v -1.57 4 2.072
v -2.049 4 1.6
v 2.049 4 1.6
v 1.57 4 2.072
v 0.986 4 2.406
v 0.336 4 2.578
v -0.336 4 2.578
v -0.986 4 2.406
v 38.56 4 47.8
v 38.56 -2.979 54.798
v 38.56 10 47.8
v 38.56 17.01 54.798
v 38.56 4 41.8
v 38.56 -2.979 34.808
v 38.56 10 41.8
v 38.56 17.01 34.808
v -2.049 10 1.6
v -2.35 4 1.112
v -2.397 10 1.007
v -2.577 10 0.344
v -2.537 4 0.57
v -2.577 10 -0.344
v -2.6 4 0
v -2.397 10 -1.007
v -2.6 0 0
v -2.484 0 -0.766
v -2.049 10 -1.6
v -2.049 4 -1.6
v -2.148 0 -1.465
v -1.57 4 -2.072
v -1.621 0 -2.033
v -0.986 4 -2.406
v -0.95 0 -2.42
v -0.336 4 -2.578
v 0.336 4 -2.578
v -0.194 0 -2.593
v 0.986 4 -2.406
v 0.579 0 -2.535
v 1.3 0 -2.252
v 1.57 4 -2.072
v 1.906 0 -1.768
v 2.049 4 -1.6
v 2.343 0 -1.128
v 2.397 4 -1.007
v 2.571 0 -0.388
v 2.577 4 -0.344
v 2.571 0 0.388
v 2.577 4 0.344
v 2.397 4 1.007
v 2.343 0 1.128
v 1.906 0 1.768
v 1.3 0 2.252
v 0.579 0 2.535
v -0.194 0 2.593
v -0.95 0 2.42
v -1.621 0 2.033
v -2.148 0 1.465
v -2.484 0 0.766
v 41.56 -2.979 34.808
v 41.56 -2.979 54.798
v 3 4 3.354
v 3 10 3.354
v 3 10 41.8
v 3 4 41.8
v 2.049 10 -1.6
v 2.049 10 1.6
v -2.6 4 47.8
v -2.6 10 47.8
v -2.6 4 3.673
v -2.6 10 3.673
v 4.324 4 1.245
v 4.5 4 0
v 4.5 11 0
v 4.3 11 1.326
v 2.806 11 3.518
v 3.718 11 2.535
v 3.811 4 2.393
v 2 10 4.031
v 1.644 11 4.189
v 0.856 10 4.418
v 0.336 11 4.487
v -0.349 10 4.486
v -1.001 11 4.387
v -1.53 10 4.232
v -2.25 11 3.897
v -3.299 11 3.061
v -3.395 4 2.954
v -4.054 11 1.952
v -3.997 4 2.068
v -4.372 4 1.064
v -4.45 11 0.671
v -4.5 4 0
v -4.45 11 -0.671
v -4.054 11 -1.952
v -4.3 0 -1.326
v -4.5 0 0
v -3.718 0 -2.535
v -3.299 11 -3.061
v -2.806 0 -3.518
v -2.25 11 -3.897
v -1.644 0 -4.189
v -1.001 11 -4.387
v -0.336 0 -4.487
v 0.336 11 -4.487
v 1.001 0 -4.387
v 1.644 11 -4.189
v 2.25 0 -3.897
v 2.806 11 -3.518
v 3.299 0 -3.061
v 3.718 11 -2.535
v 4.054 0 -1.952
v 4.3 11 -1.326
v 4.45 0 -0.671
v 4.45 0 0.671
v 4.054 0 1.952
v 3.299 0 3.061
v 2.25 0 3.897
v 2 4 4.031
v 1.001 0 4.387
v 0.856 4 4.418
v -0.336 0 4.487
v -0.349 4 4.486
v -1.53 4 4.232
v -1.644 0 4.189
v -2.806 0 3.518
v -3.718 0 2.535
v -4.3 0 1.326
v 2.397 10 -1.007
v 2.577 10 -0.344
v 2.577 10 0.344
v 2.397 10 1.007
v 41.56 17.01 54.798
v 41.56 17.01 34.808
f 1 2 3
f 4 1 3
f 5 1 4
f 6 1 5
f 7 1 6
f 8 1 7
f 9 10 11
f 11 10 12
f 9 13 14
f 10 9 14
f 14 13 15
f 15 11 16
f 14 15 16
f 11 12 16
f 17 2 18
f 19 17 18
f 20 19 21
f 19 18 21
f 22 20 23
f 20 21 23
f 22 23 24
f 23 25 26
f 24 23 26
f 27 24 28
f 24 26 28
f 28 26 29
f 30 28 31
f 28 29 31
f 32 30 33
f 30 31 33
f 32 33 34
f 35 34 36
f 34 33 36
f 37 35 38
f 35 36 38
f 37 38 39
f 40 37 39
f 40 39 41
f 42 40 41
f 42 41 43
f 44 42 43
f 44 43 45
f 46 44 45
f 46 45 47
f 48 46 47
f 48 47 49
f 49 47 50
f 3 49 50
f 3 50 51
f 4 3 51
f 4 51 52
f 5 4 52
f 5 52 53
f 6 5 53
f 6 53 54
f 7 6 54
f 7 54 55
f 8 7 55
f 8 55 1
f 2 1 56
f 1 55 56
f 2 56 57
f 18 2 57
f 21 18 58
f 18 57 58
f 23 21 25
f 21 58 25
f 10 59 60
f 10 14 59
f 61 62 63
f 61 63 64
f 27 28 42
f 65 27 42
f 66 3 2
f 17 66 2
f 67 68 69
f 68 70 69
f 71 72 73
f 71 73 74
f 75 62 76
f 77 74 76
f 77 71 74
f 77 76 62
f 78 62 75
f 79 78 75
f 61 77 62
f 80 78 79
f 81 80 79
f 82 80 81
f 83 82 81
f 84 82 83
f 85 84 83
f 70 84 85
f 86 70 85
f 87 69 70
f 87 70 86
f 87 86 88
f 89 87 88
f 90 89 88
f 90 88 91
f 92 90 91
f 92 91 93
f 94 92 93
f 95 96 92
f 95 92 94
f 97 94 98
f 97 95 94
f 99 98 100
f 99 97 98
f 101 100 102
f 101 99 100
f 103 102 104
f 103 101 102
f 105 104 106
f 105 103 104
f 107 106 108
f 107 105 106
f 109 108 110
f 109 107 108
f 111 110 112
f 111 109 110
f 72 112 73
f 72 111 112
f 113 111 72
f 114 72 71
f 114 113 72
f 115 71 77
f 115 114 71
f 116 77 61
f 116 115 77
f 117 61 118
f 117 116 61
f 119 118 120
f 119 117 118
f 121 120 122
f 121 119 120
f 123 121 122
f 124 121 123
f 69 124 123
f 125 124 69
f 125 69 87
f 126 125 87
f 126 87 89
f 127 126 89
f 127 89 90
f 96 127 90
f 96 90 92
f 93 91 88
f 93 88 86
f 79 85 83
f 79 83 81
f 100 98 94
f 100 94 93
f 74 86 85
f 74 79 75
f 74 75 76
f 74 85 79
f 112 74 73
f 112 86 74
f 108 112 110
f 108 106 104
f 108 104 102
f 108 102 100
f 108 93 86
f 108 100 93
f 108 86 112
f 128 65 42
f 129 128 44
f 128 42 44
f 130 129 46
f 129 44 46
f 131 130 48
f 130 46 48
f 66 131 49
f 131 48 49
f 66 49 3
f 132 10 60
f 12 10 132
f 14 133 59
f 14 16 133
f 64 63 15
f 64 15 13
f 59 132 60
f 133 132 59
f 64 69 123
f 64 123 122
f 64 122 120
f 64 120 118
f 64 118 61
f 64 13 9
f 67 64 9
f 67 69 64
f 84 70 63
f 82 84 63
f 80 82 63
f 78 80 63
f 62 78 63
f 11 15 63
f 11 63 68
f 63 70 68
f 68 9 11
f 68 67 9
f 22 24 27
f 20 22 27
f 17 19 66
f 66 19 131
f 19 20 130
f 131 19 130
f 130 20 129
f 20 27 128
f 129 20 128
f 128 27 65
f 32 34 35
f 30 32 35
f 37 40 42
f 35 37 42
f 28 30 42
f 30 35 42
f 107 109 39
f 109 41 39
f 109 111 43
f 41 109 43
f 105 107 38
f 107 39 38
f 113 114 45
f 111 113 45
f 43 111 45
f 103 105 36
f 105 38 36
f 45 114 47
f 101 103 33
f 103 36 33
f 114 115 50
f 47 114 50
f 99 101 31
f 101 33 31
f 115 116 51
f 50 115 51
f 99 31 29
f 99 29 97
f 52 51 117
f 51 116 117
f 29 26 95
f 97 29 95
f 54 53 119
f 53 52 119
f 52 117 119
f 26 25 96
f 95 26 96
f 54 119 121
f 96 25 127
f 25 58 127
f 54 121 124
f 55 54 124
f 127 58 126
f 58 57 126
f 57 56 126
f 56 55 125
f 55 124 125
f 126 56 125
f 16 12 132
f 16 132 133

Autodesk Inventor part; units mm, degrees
ref_plane "YZ Plane" through (0, 0, 0) normal (1, 0, 0) x (0, 1, 0)
ref_plane "XZ Plane" through (0, 0, 0) normal (0, 1, 0) x (-1, 0, 0)
ref_plane "XY Plane" through (0, 0, 0) normal (0, 0, 1) x (1, 0, 0)
sketch "Sketch3" plane through (0, 0, 0) normal (0, 1, 0) x (-1, 0, 0)
  circle A0 centre (0, 0) radius 4.5
  circle A1 centre (0, 0) radius 2.6
  dimension "d10" = 9
  dimension "d11" = 5.2
extrude "Extrusion2" add sketch "Sketch3" along normal blind 4
sketch "Sketch4" plane through (0, 4, 0) normal (0, 1, 0) x (1, 0, 0)
  circle A0 centre (0, 0) radius 2.6 projected
  line L0 (0, -2.6) -> (0, -1.6)
  line L1 (0, -1.6) -> (0, 2.6)
  line L2 (0, -1.6) -> (-2.0494, -1.6)
  line L3 (0, -1.6) -> (2.0494, -1.6)
  line L4 (0, 2.6) -> (0, 2.6)
  line L5 (0, 2.6) -> (0, 2.6)
  circle A1 centre (0, 0) radius 4.5 projected
  circle A2 centre (0, 0) radius 2.6 projected
  line L6 (0, 2.6) -> (0, 1.6)
  line L7 (0, 1.6) -> (2.0494, 1.6)
  line L8 (0, 1.6) -> (-2.0494, 1.6)
  point P0 (2.0494, 1.6)
  point P1 (-2.0494, 1.6)
  dimension "d14" = 1
  dimension "d20" = 1
extrude "Extrusion3" add sketch "Sketch4" along normal blind 6 contours L7 L1 A0 | A0 L0 L3 | L1 L8 A0 | A0 L2 L0 | A1
sketch "Sketch5" plane through (0, 10, 0) normal (0, 1, 0) x (1, 0, 0)
  circle A0 centre (0, 0) radius 4.5 projected
extrude "Extrusion4" add sketch "Sketch5" along normal blind 1
sketch "Sketch6" plane through (2.0494, 4, 1.6) normal (0, 0, -1) x (-1, 0, 0)
  line L0 (4.0988, 6) -> (0, 6) projected
  line L1 (2.0494, 6) -> (2.0494, 3)
  line L2 (2.0494, 6) -> (5.0494, 6) construction
  line L3 (2.0494, 6) -> (-0.9506, 6)
  line L4 (2.0494, 6) -> (5.0494, 6) construction
  line L5 (-0.9506, 6) -> (-0.9506, 0)
  line L6 (-0.9506, 0) -> (5.0494, 0)
  line L7 (5.0494, 0) -> (5.0494, 6)
  line L8 (5.0494, 6) -> (-0.9506, 6)
  line L9 (4.6494, 6) -> (4.6494, -4) projected
  point P0 (2.0494, -4)
  point P1 (4.6494, 0)
  point P2 (0, 6)
  dimension "d21" = 3
  dimension "d22" = 90
  dimension "d32" = 3
  dimension "d33" = 180
  dimension "d34" = 6
  dimension "d35" = 90
  dimension "d36" = 6
  dimension "d37" = 90
extrude "Extrusion7" add sketch "Sketch6" against normal blind 46.2 contours L8 L9 L6 L5 L3 L0
sketch "Sketch8" plane through (3, 4, 3.3541) normal (1, 0, 0) x (0, 0, -1)
  line L0 (-0.3188, 6) -> (-44.4459, 6) projected
  line L1 (-44.4459, 6) -> (-38.4459, 6)
  line L2 (-38.4459, 6) -> (-38.4459, 0)
  line L3 (-0.3188, 0) -> (-44.4459, 0) projected
  line L4 (0, 6) -> (0, 0) projected
  line L5 (0, 6) -> (-44.4459, 6) projected
  line L6 (-44.4459, 0) -> (-44.4459, 6) projected
  line L7 (0, 0) -> (-44.4459, 0) projected
  point P0 (3.3541, -4)
  dimension "d40" = 6
extrude "Extrusion8" add sketch "Sketch8" along normal blind 35.56 contours L2 L3 L6 L0
sketch "Sketch11" plane through (38.56, 4, 3.3541) normal (1, 0, 0) x (0, 0, -1)
  line L0 (-44.4459, 6) -> (-44.4459, 0) projected
  line L1 (-44.4459, 6) -> (-51.4436, 6)
  line L2 (-51.4436, 6) -> (-51.4436, 13.0104)
  line L3 (-51.4436, 13.0104) -> (-44.4459, 13.0104)
  line L4 (-44.4459, 13.0104) -> (-44.4459, 6)
  line L5 (-51.4436, 13.0104) -> (-31.4538, 13.0104)
  line L6 (-31.4538, 13.0104) -> (-31.4538, -6.9794)
  line L7 (-31.4538, -6.9794) -> (-51.4436, -6.9794)
  line L8 (-51.4436, -6.9794) -> (-51.4436, 13.0104)
  point P0 (3.3541, -4)
  dimension "d59" = 6.9977
  dimension "d60" = 7.0104
  dimension "d61" = 19.9898
  dimension "d62" = 19.9898
extrude "Extrusion11" add sketch "Sketch11" along normal blind 3
properties part number "socket"
